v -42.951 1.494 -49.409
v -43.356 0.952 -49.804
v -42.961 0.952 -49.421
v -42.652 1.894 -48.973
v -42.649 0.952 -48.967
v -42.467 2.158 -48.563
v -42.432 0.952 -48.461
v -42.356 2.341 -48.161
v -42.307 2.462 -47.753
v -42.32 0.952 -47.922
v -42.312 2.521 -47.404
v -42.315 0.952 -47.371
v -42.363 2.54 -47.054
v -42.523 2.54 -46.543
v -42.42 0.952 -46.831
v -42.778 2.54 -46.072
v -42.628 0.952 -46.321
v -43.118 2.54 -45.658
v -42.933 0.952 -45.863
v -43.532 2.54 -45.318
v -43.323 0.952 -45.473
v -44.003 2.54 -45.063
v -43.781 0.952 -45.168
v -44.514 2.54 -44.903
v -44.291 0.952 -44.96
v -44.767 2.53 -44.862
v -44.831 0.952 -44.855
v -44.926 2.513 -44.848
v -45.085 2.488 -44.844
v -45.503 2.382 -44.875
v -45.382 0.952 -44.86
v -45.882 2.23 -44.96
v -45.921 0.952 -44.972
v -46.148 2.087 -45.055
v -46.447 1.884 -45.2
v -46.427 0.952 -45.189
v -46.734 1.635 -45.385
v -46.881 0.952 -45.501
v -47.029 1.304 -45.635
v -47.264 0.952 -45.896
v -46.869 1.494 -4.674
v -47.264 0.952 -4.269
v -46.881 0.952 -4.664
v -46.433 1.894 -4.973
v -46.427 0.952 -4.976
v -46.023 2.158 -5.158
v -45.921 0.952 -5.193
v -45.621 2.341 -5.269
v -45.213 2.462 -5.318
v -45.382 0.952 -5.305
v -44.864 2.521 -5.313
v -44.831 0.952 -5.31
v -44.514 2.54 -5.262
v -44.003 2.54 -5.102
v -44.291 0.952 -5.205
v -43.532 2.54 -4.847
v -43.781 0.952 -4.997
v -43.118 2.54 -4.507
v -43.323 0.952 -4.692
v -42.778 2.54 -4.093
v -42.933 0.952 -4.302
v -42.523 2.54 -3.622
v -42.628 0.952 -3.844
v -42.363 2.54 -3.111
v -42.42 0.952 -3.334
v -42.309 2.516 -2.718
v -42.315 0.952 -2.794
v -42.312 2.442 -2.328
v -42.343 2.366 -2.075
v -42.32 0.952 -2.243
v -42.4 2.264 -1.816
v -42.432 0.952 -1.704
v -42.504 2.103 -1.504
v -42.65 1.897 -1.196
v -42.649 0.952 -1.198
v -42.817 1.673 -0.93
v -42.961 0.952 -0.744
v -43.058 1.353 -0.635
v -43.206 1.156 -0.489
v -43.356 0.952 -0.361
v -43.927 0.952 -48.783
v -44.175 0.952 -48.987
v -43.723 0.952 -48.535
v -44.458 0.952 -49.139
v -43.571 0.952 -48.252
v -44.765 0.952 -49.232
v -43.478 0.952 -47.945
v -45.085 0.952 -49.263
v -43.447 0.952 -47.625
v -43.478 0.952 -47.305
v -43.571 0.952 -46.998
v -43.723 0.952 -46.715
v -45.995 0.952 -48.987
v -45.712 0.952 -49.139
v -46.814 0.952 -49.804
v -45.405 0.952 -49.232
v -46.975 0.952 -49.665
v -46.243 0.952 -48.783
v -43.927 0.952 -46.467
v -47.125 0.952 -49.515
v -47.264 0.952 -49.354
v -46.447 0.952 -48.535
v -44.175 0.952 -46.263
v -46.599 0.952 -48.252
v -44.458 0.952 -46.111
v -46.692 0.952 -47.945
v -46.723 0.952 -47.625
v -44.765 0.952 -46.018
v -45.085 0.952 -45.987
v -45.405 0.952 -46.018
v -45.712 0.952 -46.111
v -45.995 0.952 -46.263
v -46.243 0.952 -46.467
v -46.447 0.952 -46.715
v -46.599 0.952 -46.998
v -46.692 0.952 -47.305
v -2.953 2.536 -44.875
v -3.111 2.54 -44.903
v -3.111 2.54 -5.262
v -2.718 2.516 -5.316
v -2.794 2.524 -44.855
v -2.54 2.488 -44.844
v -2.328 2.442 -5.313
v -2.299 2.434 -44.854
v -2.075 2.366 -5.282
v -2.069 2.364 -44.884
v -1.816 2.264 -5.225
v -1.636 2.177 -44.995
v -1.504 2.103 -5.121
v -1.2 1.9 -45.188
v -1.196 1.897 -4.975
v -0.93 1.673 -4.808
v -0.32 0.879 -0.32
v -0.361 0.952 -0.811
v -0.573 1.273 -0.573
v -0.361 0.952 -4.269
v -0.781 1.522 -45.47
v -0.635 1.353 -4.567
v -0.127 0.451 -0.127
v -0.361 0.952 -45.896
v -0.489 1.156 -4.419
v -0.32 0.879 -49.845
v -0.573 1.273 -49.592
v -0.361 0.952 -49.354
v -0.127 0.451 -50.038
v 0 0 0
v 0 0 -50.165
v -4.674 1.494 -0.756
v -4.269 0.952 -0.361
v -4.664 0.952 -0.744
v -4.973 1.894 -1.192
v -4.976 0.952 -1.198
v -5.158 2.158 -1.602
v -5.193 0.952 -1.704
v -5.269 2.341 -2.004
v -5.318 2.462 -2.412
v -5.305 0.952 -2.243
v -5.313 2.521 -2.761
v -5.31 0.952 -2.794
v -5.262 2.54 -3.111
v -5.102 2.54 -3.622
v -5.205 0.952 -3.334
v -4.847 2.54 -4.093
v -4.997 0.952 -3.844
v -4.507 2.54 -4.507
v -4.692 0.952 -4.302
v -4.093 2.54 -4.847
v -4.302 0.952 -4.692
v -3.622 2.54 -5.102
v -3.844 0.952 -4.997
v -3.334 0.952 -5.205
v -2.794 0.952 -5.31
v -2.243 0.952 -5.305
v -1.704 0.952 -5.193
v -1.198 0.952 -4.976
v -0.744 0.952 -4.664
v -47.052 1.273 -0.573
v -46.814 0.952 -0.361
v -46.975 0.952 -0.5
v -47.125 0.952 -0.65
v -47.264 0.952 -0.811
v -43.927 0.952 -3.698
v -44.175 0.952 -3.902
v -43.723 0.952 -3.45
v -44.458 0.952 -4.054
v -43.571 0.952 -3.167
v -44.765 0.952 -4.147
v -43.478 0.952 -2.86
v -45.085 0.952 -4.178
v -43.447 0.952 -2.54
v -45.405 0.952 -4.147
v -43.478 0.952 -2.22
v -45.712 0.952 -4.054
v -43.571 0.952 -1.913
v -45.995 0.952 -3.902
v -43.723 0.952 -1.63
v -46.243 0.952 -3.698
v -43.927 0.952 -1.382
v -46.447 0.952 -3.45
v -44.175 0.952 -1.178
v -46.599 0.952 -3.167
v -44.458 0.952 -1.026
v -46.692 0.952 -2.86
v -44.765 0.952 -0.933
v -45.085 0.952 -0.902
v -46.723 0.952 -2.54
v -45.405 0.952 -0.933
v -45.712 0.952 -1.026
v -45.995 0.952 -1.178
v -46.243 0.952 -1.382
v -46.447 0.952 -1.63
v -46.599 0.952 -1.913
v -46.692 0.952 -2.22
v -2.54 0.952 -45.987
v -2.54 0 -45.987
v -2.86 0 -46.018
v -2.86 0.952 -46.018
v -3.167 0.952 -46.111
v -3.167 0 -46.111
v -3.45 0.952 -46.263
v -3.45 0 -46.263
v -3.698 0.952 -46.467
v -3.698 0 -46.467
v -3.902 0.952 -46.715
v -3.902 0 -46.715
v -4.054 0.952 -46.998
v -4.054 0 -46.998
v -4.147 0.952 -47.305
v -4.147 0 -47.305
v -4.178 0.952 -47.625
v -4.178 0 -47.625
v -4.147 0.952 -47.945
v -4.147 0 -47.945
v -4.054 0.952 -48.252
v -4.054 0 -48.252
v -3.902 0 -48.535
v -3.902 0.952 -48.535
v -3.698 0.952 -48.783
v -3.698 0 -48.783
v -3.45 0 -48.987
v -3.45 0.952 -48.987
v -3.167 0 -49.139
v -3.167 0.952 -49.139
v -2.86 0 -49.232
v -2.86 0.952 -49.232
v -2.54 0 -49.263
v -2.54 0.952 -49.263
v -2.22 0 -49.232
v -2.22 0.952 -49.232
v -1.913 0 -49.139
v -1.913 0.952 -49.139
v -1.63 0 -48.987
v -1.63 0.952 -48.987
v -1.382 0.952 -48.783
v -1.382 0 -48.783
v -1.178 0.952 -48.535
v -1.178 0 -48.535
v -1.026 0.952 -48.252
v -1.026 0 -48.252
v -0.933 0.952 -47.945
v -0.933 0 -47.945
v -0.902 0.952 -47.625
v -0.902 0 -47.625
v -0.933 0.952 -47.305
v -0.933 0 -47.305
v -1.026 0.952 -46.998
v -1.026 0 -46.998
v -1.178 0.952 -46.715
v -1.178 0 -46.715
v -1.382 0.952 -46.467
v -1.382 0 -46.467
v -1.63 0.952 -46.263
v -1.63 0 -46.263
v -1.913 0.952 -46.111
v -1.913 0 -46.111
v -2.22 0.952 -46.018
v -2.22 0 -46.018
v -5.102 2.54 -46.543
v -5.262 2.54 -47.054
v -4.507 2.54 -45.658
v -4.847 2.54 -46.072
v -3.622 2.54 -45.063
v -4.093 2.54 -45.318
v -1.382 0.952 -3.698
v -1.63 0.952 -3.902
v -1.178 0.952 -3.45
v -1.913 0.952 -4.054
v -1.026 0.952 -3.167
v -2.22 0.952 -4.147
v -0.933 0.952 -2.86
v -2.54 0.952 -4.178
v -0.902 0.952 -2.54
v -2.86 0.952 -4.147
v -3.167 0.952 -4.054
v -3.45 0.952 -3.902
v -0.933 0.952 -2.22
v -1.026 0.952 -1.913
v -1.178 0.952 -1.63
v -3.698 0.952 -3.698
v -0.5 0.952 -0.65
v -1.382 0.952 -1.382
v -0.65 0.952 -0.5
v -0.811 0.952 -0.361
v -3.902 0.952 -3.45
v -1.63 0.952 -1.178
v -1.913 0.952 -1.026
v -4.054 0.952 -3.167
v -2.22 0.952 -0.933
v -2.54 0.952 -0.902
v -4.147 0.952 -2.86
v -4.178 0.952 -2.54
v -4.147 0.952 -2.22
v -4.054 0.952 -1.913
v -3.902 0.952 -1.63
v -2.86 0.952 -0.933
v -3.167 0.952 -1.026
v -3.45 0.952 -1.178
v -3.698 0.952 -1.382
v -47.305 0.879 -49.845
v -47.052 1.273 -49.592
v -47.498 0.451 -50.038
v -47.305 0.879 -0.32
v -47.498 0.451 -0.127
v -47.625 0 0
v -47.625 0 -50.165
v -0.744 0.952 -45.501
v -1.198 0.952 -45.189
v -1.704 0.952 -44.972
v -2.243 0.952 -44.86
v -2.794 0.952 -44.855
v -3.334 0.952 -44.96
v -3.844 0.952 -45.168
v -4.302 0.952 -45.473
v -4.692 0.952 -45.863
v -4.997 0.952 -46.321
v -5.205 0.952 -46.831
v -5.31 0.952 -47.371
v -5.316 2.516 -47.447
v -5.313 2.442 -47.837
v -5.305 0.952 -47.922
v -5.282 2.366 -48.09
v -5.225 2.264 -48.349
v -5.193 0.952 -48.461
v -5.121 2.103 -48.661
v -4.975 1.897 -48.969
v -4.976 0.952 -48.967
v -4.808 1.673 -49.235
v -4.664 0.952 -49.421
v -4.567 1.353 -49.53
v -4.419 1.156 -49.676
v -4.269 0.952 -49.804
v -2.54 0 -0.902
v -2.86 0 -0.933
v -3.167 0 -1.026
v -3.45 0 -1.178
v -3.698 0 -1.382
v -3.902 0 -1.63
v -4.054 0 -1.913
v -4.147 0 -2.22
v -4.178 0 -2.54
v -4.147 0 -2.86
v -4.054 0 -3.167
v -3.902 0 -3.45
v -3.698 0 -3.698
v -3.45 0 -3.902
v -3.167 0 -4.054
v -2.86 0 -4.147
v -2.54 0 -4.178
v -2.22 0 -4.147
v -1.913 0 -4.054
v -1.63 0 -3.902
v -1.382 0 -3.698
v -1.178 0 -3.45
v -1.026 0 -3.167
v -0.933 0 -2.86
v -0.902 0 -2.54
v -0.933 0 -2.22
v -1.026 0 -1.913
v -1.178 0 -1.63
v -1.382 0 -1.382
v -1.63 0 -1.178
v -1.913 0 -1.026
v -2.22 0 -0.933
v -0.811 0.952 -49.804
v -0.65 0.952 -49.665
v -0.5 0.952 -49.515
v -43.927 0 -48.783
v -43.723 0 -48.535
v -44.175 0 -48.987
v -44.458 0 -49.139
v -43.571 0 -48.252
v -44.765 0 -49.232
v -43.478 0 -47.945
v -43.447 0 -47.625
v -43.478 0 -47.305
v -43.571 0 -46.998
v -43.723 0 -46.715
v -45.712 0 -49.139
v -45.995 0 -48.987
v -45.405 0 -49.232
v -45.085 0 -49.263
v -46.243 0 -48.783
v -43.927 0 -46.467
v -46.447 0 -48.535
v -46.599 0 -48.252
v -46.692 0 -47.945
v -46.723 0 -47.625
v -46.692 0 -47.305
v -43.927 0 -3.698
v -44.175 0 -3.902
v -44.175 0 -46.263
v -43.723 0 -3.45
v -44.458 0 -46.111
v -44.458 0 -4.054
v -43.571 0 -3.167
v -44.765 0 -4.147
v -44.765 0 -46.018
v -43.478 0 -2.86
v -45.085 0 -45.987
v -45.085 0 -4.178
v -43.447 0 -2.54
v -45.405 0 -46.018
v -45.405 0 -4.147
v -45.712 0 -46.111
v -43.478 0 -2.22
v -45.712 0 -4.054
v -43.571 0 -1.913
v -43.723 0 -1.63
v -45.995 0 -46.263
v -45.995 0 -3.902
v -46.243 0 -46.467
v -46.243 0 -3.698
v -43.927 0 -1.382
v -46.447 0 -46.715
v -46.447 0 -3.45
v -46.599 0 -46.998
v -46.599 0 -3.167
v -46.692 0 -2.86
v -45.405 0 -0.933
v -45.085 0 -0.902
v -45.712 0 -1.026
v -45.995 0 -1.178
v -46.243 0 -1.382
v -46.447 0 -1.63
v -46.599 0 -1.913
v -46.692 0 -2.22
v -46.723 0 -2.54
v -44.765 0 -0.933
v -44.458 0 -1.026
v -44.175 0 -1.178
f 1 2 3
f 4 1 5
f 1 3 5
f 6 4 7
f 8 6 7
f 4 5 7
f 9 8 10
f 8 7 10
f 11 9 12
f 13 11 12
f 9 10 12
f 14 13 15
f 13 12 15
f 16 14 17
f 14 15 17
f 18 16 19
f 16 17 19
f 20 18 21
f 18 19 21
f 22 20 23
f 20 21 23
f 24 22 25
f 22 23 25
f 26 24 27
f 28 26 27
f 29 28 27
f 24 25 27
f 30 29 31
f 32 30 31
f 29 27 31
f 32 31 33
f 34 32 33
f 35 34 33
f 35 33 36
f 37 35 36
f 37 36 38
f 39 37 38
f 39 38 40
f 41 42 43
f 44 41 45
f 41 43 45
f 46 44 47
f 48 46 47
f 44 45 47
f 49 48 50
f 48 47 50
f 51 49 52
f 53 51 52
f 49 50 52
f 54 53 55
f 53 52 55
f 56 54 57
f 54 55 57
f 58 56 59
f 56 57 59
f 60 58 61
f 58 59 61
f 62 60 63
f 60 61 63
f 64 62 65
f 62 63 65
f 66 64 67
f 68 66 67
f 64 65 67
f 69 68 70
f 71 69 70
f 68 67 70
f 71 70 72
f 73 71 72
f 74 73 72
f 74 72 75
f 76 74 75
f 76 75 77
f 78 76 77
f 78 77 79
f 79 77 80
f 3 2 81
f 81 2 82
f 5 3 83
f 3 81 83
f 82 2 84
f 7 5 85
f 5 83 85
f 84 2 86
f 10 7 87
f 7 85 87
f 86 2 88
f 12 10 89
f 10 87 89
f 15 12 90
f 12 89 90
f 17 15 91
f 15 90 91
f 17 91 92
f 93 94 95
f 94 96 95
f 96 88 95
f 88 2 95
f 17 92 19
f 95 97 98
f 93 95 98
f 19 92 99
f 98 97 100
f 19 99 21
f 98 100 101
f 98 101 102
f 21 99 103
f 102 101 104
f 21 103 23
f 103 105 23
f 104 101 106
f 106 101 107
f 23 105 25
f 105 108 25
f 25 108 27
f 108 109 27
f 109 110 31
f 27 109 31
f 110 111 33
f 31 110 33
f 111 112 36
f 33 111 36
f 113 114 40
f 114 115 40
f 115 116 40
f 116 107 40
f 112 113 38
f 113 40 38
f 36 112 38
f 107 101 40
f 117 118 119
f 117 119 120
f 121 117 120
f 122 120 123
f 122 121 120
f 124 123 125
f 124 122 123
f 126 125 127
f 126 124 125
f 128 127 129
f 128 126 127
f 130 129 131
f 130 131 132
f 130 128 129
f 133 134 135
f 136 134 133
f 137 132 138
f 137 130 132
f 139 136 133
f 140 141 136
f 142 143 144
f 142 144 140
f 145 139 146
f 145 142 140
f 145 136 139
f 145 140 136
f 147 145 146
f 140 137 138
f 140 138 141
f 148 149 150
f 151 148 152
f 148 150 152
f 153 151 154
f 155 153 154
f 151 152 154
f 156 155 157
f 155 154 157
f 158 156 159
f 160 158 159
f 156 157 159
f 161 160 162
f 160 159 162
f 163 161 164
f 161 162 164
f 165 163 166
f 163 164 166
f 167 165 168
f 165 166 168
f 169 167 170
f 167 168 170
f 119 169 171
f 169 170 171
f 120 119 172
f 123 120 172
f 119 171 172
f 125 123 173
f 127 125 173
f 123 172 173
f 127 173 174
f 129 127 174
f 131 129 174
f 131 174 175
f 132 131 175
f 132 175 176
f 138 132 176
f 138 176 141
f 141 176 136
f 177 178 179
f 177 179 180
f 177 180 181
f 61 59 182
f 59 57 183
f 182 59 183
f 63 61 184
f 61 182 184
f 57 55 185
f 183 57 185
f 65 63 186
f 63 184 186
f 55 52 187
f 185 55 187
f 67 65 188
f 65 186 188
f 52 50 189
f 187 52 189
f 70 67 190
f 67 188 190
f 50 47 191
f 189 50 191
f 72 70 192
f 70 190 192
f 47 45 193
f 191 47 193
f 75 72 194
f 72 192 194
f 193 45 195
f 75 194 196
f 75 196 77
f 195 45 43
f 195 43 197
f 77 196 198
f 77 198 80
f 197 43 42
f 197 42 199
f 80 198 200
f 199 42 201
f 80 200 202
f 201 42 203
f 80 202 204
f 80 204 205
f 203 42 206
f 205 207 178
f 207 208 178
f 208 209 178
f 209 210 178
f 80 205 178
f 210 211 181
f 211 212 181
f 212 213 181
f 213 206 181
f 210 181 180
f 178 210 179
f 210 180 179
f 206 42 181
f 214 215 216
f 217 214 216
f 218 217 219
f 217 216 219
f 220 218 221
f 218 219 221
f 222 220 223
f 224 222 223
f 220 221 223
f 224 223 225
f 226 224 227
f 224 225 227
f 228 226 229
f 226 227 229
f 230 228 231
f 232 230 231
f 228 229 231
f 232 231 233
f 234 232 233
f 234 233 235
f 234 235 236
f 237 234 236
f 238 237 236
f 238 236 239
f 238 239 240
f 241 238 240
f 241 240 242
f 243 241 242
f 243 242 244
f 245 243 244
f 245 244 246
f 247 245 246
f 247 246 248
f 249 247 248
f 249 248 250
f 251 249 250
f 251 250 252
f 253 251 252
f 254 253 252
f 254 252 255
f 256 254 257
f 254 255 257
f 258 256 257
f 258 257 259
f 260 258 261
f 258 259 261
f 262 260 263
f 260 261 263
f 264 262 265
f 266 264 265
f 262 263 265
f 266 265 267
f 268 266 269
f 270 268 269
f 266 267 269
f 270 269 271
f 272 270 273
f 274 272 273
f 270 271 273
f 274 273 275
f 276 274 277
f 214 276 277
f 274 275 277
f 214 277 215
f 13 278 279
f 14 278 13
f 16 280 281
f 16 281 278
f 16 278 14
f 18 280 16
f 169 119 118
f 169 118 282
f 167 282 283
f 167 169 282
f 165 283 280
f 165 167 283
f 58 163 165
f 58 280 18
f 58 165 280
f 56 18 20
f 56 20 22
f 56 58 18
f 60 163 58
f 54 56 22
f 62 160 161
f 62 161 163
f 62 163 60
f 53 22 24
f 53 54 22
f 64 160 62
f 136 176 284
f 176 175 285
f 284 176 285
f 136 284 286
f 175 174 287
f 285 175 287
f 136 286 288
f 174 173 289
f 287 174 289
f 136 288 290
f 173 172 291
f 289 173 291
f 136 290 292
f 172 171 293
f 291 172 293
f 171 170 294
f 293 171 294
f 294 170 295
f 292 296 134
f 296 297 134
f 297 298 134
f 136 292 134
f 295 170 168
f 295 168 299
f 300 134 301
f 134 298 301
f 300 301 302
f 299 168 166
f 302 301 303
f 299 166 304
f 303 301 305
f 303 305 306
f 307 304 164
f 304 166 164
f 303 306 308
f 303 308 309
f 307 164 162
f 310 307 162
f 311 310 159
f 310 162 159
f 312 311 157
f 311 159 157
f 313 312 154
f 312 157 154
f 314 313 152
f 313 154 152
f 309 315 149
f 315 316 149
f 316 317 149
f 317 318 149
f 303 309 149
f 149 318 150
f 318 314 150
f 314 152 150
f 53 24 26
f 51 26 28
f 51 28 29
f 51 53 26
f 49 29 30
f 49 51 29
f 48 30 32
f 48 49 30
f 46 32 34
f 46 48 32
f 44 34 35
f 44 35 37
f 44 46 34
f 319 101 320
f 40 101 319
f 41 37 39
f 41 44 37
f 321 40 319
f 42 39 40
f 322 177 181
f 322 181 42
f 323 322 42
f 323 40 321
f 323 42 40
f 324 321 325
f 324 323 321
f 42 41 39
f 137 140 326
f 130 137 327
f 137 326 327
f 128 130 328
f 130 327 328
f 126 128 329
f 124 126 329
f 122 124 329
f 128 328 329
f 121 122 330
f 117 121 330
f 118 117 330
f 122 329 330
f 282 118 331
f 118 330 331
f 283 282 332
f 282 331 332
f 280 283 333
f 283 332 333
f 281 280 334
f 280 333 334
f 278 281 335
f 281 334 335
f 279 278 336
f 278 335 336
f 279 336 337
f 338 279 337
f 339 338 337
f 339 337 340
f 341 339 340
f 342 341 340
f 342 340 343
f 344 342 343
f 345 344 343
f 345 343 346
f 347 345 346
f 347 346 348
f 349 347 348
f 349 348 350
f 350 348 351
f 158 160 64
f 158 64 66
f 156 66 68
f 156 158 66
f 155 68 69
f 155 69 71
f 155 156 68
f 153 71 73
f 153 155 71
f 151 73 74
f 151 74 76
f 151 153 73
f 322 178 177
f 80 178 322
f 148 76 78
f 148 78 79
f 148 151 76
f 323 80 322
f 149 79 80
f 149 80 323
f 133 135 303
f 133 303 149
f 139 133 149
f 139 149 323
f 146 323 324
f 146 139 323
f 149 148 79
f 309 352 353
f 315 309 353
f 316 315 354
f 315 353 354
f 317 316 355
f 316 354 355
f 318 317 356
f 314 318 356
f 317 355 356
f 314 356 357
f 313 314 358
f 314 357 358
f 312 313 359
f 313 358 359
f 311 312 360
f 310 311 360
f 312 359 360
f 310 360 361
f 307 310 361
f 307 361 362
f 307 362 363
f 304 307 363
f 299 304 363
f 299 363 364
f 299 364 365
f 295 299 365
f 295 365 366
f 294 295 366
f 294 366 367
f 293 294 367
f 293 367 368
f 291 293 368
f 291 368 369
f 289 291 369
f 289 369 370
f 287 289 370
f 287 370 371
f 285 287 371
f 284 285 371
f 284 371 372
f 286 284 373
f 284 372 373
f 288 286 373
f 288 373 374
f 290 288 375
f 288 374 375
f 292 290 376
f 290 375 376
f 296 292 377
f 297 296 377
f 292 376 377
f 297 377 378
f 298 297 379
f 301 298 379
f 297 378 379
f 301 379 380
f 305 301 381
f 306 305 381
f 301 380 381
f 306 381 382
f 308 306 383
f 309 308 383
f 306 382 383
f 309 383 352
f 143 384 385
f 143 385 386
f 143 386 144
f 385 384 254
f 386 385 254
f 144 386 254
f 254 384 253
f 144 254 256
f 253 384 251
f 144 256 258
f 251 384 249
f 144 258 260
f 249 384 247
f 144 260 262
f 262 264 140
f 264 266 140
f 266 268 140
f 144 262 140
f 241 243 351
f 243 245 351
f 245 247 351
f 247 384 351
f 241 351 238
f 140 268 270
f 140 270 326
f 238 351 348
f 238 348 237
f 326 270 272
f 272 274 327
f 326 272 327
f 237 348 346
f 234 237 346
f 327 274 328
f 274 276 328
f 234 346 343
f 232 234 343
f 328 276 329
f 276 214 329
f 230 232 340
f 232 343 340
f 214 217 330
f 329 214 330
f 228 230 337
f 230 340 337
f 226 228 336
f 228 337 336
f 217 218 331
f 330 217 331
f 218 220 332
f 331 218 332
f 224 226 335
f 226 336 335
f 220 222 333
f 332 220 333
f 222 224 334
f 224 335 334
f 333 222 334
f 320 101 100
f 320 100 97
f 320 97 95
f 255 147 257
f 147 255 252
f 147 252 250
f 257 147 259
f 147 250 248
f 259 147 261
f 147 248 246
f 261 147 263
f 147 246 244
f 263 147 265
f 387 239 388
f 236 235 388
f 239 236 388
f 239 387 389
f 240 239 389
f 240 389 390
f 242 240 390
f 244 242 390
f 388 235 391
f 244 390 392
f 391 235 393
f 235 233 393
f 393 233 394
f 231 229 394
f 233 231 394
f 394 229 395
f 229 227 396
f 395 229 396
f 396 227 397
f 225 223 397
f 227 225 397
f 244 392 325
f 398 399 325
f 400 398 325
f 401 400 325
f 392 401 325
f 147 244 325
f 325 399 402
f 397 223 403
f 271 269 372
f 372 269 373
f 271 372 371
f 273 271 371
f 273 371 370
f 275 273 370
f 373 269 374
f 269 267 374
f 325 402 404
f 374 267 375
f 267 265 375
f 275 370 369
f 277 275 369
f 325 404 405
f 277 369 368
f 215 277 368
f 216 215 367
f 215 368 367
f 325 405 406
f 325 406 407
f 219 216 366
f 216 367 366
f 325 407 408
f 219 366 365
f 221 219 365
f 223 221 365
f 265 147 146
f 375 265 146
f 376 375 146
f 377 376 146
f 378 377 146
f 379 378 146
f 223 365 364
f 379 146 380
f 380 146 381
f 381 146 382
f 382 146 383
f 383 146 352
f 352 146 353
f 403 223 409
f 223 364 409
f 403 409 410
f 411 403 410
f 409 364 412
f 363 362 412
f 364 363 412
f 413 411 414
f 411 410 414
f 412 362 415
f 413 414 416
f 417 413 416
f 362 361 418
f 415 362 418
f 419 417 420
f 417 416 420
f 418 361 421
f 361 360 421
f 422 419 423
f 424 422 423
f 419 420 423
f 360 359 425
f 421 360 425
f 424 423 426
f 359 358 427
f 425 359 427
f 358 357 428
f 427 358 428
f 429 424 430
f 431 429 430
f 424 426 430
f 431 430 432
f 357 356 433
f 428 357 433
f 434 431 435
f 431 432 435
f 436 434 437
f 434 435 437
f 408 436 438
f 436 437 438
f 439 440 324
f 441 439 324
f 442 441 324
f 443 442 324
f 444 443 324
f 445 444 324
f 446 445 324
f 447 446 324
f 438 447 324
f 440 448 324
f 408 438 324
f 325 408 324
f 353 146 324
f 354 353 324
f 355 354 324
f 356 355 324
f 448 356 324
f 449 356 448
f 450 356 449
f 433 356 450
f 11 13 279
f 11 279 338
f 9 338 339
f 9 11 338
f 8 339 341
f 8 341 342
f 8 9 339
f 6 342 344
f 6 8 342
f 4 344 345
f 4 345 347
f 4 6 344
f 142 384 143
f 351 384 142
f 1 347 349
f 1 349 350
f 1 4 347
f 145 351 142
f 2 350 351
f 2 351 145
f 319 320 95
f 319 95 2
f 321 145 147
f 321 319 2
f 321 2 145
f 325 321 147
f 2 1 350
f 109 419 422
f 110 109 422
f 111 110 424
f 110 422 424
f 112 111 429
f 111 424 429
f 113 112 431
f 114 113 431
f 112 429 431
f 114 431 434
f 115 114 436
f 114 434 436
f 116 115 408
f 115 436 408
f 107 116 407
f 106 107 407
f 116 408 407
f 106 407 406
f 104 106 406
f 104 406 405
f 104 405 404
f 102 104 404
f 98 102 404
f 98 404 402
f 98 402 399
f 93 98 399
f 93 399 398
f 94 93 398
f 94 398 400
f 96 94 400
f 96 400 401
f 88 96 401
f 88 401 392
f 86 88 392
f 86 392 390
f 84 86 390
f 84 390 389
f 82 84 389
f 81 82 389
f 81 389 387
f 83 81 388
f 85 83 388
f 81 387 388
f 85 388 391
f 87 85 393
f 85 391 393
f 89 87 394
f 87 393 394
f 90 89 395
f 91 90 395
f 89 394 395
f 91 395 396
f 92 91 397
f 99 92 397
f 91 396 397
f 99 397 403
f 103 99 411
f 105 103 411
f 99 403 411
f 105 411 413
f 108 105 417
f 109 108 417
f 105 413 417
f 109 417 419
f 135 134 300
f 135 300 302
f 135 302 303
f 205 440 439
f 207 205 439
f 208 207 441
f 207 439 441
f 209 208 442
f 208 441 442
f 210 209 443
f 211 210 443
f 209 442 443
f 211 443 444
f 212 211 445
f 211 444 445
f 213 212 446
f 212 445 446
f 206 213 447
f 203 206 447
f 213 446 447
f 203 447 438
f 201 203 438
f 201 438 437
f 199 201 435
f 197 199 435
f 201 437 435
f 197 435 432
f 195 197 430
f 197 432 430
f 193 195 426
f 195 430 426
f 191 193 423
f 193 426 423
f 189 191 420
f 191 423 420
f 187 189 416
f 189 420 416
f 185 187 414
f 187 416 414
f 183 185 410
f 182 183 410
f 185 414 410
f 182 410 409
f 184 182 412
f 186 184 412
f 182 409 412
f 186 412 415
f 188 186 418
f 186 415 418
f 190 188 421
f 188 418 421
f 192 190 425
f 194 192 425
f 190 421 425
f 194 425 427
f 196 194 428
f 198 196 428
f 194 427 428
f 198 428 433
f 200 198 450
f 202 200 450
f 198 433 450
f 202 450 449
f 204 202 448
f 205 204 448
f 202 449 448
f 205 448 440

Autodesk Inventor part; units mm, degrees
ref_plane "YZ Plane" through (0, 0, 0) normal (1, 0, 0) x (0, 1, 0)
ref_plane "XZ Plane" through (0, 0, 0) normal (0, 1, 0) x (-1, 0, 0)
ref_plane "XY Plane" through (0, 0, 0) normal (0, 0, 1) x (1, 0, 0)
sketch "Sketch1" plane through (0, 0, 0) normal (0, 1, 0) x (-1, 0, 0)
  line L0 (0, 0) -> (47.625, 0)
  line L1 (47.625, 0) -> (47.625, -50.165)
  line L2 (47.625, -50.165) -> (0, -50.165)
  line L3 (0, -50.165) -> (0, 0)
  dimension "d0" = 47.625
  dimension "d1" = 50.165
extrude "Extrusion1" add sketch "Sketch1" along normal blind 2.54
sketch "Sketch2" plane through (0, 2.54, 0) normal (0, 1, 0) x (1, 0, 0)
  line L0 (-47.625, 0) -> (0, 0) projected
  line L1 (0, 0) -> (-2.54, 0)
  line L2 (-2.54, 0) -> (-2.54, 2.54)
  line L3 (-2.54, 2.54) -> (0, 2.54)
  line L4 (0, 2.54) -> (0, 0)
  line L5 (0, 0) -> (0, 50.165) projected
  line L6 (0, 50.165) -> (-2.54, 50.165)
  line L7 (-2.54, 50.165) -> (-2.54, 47.625)
  line L8 (-2.54, 47.625) -> (0, 47.625)
  line L9 (0, 47.625) -> (0, 50.165)
  line L10 (-47.625, 50.165) -> (-47.625, 0) projected
  line L11 (-47.625, 50.165) -> (-45.085, 50.165)
  line L12 (-45.085, 50.165) -> (-45.085, 47.625)
  line L13 (-45.085, 47.625) -> (-47.625, 47.625)
  line L14 (-47.625, 47.625) -> (-47.625, 50.165)
  line L15 (-47.625, 0) -> (-45.085, 0)
  line L16 (-45.085, 0) -> (-45.085, 2.54)
  line L17 (-45.085, 2.54) -> (-47.625, 2.54)
  line L18 (-47.625, 2.54) -> (-47.625, 0)
  dimension "d4" = 2.54
  dimension "d5" = 2.54
  dimension "d6" = 2.54
  dimension "d7" = 2.54
hole "Hole1" at (-45.085, 2.54, -47.625) at (-2.54, 2.54, -47.625) at (-2.54, 2.54, -2.54) at (-45.085, 2.54, -2.54) direction (0, -1, 0) diameter 3.2766 depth 7.2771 counterbore diameter 5.5626 counterbore depth 1.5875 clearance for "Socket Head Cap Screw" size "#4" standard "Ansi Unified Screw Threads"
fillet "Fillet1" radius 3.175 4 edges at (-23.8125, 2.54, 0) (0, 2.54, -25.0825) (-23.8125, 2.54, -50.165) (-47.625, 2.54, -25.0825)
properties part number "Lid-SensorHousing"
